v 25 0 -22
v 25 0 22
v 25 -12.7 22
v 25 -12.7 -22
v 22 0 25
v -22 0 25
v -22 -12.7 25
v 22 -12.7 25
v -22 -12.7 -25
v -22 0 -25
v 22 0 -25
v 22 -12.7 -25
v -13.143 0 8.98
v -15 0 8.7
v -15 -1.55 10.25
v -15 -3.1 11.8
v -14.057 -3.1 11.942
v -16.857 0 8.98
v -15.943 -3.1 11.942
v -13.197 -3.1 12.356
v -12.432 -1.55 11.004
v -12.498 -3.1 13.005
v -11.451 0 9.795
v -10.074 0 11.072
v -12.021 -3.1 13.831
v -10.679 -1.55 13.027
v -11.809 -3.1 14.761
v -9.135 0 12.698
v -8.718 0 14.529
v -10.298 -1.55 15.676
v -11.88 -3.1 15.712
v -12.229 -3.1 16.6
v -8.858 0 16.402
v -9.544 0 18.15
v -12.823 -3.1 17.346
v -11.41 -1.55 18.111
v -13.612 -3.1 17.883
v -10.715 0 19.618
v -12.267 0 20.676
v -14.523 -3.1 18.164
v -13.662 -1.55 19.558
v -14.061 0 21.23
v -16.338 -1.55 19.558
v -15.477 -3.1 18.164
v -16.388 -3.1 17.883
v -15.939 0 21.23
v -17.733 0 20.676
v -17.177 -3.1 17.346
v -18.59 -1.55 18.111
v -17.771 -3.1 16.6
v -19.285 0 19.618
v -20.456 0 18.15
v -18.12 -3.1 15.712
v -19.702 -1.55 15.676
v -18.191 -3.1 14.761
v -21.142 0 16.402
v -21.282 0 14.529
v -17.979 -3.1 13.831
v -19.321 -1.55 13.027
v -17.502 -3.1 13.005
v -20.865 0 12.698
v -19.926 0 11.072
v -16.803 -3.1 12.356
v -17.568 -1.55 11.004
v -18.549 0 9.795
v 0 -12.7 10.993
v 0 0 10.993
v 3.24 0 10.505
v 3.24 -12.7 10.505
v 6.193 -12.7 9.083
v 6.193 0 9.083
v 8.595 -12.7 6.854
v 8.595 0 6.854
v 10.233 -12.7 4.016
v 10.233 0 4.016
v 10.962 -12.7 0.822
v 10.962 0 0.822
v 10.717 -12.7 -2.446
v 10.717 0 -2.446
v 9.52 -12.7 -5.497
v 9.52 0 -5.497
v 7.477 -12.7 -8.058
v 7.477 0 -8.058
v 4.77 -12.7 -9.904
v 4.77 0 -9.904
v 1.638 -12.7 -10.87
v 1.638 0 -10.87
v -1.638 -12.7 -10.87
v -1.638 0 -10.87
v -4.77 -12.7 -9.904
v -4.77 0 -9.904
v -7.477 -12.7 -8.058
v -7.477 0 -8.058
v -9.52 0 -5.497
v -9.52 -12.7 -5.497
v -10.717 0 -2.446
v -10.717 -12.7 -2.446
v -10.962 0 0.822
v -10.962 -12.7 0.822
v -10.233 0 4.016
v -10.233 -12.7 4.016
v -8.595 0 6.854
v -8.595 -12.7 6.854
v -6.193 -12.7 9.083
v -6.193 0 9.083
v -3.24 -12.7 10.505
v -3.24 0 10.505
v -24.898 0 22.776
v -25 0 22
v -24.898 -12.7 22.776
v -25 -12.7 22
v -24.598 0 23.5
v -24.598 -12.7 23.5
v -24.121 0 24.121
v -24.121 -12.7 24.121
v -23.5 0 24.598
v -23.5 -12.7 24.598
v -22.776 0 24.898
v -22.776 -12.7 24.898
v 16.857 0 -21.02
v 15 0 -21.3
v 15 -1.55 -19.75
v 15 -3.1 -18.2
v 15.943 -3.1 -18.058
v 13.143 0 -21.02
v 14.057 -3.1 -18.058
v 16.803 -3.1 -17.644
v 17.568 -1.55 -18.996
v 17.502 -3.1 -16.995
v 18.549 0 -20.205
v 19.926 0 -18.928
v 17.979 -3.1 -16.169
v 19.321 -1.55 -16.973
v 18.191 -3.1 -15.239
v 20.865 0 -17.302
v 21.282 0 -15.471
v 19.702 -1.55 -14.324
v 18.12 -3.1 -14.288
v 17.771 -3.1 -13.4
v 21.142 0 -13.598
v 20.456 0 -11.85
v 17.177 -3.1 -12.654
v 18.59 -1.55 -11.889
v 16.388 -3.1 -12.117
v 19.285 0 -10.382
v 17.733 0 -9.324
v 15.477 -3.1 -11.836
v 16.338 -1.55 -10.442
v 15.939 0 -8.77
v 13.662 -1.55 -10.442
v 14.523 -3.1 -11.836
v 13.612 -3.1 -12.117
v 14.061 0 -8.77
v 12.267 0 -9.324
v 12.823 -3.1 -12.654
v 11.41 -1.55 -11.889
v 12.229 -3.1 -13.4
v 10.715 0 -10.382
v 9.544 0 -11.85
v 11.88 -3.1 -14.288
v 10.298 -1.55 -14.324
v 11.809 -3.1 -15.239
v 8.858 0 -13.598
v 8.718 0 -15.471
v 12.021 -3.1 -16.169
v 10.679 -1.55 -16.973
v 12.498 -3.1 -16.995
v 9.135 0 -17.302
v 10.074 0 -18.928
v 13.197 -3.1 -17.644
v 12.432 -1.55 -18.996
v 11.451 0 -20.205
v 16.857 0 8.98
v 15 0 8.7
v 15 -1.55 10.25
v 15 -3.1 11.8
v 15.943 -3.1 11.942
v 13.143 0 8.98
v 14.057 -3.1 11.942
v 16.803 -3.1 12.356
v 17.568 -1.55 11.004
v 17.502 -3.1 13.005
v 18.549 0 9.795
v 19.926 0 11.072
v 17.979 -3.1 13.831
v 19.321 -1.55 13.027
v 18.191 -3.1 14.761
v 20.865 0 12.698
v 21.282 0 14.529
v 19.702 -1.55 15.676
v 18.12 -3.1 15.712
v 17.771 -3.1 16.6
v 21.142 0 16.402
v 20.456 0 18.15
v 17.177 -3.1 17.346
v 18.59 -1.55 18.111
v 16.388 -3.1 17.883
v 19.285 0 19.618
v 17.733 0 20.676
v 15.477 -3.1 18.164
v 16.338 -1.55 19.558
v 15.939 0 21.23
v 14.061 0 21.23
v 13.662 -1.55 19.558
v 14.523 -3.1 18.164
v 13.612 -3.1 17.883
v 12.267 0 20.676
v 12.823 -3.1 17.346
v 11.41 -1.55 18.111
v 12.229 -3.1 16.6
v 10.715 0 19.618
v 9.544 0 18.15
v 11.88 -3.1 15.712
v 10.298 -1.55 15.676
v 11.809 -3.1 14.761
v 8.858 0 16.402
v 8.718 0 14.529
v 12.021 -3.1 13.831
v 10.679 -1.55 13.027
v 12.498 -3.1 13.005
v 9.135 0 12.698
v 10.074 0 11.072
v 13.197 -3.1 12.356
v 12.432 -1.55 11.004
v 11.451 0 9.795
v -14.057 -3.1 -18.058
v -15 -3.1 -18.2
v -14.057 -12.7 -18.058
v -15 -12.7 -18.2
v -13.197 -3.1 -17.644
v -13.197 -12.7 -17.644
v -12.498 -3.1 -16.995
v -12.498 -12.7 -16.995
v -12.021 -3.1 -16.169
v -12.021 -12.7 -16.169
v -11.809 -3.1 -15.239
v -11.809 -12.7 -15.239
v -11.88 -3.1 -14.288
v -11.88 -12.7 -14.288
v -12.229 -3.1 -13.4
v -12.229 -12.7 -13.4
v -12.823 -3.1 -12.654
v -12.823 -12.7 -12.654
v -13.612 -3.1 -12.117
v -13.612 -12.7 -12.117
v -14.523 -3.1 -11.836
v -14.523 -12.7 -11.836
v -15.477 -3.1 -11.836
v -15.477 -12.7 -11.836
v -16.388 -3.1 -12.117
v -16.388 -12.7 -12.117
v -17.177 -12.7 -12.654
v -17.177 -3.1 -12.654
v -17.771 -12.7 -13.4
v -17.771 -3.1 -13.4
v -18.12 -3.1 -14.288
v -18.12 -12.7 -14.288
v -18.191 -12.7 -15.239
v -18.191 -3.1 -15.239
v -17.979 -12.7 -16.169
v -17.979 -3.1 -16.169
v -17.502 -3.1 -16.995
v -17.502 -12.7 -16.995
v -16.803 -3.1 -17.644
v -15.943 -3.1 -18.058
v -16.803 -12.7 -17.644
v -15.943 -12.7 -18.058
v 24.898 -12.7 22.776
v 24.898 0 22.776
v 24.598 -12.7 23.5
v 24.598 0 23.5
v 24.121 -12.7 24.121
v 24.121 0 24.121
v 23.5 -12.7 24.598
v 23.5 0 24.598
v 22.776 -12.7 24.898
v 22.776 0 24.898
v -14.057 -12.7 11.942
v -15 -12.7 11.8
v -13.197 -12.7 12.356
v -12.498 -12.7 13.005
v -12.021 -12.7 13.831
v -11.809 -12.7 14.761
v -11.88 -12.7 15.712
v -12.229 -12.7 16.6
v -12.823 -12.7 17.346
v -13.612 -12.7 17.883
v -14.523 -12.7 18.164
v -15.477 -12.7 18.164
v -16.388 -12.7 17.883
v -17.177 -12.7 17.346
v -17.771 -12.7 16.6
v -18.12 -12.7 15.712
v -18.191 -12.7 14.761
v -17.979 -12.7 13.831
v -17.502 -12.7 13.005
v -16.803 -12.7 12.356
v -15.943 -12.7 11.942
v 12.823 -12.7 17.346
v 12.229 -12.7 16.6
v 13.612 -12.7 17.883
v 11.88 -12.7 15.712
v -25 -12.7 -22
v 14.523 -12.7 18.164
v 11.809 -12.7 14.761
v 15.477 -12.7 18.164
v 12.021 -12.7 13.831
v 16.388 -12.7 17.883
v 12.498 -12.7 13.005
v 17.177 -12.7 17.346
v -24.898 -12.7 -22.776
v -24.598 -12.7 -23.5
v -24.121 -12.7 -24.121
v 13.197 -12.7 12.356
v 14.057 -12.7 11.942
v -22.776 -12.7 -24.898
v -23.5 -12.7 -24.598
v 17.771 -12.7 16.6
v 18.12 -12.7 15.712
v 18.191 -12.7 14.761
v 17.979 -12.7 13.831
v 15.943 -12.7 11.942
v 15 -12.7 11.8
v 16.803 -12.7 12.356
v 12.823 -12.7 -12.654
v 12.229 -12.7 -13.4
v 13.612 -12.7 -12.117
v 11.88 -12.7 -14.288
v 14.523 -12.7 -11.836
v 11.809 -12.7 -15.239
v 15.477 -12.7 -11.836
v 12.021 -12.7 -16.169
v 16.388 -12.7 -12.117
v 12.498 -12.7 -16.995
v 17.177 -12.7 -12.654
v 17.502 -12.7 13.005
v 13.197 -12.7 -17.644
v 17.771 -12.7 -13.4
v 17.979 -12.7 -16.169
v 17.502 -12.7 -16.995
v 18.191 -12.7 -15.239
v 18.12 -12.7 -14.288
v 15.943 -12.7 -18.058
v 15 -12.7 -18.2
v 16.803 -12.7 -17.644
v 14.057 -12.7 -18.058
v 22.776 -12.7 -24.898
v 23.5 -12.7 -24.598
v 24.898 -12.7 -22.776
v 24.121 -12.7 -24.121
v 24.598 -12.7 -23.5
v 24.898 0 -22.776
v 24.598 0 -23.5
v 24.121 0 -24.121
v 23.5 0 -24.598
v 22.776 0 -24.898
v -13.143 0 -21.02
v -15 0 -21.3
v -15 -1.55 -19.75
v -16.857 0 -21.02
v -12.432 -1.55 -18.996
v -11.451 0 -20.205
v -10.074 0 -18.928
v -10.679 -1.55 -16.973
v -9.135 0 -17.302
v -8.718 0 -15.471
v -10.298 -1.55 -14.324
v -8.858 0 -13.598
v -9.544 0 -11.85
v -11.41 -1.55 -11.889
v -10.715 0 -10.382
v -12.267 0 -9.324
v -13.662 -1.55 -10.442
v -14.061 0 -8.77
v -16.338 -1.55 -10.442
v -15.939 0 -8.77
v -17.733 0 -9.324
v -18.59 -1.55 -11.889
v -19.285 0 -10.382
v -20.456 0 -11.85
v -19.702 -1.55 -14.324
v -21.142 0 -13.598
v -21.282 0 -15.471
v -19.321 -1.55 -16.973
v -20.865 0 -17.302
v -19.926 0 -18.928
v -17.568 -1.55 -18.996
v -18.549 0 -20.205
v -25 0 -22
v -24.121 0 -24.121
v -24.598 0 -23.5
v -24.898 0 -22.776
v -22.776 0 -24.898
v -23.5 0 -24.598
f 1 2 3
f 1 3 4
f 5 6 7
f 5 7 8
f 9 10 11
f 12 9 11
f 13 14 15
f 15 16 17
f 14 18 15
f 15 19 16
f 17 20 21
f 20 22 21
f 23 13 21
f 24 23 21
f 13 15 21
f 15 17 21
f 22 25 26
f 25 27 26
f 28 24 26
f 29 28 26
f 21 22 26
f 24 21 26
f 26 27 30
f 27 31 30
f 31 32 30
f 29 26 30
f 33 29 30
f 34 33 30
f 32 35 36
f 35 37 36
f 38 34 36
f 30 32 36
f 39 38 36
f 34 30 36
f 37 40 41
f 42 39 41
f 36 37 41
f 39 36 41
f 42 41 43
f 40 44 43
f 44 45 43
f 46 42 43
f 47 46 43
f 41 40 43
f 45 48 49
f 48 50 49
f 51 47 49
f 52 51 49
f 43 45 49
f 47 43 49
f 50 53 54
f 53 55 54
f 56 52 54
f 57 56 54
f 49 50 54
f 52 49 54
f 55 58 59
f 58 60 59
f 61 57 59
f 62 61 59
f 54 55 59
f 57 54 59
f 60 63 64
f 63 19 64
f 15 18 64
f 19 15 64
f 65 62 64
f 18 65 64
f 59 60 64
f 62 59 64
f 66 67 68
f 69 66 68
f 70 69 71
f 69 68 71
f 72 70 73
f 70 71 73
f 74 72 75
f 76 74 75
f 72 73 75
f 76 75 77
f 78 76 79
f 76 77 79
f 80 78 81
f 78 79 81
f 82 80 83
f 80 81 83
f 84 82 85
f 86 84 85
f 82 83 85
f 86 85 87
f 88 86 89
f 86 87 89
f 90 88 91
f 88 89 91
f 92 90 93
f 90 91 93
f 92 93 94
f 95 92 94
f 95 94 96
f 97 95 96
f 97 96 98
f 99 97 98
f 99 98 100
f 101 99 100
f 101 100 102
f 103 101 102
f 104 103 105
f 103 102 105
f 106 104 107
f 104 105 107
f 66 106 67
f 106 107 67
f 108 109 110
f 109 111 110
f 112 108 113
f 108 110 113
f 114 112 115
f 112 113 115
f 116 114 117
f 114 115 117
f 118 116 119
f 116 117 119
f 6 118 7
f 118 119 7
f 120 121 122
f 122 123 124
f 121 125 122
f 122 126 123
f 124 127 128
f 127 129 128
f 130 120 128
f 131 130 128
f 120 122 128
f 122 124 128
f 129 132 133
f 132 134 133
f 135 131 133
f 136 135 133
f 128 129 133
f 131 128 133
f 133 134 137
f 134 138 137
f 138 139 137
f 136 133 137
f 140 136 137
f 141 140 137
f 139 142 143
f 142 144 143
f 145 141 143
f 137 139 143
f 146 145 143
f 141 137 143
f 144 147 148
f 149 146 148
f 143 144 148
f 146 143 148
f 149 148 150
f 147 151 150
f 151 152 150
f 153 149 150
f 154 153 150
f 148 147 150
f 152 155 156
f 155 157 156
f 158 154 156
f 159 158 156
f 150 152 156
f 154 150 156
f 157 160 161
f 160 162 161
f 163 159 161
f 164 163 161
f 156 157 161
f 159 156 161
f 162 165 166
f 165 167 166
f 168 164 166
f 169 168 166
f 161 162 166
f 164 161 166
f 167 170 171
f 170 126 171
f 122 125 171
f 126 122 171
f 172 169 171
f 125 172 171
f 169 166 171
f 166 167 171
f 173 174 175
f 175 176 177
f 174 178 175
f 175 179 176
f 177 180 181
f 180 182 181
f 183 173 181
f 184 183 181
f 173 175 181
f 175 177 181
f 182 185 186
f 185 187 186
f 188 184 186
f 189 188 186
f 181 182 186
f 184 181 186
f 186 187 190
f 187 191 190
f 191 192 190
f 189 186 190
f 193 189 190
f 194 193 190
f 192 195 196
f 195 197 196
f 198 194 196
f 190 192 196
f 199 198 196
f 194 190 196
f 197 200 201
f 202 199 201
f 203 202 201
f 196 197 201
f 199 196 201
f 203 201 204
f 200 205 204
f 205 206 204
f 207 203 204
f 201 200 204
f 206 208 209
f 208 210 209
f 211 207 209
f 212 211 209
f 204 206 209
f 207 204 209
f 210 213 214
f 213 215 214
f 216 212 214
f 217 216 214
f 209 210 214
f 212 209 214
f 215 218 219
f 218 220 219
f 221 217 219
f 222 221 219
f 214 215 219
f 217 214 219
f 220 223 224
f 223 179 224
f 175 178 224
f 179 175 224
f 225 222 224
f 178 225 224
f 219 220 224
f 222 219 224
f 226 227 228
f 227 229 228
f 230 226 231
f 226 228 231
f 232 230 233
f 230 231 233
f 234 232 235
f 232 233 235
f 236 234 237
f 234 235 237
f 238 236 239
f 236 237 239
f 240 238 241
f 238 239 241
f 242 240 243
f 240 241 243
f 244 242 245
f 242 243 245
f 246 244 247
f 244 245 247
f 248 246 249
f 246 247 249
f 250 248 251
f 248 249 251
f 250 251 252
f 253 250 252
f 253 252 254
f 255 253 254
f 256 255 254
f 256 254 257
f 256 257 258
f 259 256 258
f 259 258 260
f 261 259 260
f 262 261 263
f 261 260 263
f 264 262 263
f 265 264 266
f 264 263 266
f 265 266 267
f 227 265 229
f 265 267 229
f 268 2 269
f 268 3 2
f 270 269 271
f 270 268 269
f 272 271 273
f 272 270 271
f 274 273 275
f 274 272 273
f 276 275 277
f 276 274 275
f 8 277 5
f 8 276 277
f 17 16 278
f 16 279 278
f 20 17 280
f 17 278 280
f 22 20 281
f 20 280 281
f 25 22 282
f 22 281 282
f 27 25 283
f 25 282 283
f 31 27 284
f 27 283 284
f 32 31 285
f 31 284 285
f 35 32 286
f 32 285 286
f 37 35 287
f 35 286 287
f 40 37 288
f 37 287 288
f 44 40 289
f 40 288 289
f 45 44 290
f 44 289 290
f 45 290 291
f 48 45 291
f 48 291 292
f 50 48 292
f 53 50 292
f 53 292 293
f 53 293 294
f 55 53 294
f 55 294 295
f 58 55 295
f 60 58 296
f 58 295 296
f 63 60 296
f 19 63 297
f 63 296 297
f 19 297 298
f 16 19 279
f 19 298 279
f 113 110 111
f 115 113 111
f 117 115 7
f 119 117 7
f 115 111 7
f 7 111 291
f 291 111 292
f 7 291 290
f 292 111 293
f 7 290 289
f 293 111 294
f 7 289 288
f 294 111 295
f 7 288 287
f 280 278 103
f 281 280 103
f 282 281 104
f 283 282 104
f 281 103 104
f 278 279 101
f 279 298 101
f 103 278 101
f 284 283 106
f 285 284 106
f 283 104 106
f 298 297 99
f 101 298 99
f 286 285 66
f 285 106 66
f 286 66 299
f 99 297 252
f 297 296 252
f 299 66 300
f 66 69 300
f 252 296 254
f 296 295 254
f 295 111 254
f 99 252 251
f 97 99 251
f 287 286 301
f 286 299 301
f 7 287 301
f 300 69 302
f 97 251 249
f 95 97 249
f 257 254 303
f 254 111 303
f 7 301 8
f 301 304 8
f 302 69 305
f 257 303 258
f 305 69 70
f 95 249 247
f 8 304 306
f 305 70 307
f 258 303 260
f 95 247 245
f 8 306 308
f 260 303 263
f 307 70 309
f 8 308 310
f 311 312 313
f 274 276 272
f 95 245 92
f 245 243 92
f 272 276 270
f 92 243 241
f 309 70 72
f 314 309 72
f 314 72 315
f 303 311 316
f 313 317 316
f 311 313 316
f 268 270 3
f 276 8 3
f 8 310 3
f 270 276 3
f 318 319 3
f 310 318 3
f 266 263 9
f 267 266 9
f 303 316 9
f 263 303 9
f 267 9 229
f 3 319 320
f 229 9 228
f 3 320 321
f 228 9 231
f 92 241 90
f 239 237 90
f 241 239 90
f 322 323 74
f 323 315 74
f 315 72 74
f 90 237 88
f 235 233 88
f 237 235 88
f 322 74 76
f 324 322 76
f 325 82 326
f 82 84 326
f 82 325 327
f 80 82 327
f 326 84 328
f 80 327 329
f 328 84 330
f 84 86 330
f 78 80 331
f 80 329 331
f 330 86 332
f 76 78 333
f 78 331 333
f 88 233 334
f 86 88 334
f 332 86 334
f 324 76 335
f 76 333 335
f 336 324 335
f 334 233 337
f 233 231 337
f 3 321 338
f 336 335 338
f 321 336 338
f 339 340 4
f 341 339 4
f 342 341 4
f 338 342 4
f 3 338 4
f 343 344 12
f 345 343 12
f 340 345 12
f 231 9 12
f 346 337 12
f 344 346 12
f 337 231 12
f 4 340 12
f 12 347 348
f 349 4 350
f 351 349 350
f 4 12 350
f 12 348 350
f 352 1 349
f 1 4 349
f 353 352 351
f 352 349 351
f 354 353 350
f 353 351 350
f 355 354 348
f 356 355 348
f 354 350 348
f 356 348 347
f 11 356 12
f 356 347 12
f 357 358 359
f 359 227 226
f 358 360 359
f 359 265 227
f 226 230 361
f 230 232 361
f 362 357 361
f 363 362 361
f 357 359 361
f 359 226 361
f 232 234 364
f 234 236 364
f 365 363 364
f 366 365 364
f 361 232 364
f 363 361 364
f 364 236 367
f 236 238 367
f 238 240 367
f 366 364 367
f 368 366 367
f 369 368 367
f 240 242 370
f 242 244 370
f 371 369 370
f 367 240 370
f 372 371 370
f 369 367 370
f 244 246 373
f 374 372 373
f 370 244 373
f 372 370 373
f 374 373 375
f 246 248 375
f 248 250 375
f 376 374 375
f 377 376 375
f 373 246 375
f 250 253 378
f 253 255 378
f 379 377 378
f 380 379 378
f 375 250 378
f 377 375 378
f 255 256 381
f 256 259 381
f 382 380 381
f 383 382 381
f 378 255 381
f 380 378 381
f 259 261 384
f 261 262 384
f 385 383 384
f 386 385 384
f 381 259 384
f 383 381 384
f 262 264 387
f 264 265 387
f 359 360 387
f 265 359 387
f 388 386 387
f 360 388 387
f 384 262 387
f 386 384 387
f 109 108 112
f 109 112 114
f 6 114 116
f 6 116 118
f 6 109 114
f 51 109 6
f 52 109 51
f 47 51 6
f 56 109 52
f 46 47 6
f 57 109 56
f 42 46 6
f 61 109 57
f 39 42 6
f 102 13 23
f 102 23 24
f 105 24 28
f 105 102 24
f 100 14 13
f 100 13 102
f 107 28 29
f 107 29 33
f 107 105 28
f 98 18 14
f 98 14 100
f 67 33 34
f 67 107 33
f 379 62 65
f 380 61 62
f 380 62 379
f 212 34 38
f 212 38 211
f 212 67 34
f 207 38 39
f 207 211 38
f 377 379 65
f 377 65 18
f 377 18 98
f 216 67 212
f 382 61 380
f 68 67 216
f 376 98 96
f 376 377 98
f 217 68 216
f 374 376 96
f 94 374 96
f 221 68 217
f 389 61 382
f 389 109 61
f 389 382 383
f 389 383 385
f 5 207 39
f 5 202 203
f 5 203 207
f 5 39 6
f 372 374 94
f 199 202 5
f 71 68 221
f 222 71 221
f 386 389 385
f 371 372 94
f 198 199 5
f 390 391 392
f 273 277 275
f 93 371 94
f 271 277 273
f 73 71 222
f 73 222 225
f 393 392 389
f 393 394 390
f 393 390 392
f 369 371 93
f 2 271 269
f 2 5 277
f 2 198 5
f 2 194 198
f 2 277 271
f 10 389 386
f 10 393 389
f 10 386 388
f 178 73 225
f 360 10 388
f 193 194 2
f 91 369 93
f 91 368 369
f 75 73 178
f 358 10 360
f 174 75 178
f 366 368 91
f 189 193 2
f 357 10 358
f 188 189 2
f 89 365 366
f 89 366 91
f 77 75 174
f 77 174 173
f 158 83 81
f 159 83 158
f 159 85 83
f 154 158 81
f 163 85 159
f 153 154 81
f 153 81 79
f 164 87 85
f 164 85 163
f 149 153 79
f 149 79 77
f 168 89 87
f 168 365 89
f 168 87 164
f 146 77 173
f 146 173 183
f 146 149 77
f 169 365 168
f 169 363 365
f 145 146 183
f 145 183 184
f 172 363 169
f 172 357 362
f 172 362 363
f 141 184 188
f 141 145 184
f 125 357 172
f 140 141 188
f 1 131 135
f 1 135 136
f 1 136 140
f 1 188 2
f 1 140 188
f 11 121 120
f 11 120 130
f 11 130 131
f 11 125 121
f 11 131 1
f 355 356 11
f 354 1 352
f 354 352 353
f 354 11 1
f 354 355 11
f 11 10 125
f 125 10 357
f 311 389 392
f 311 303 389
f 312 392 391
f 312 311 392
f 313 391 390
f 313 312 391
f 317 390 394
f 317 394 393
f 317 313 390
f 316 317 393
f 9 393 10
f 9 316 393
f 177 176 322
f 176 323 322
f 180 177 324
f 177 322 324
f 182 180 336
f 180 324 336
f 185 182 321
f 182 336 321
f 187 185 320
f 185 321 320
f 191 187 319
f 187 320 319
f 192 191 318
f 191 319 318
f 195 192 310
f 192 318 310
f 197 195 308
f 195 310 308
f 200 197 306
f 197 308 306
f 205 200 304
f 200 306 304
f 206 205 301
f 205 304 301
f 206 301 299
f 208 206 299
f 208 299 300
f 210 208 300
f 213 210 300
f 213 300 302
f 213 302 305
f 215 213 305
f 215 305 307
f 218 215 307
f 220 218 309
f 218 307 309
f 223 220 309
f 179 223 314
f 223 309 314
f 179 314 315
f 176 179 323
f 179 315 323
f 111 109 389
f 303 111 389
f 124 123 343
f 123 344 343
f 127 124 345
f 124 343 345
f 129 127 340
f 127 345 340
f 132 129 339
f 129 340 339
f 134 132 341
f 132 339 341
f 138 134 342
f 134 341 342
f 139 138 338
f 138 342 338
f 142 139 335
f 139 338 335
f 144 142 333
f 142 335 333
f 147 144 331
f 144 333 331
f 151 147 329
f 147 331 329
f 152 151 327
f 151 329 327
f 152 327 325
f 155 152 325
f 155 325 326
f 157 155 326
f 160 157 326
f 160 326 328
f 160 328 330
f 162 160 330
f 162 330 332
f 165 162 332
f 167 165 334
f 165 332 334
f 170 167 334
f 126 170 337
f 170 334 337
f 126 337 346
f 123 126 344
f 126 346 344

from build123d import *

# Parameters (mm, degrees)
SKETCH2_W                                       = 50
SKETCH2_H                                       = 50
SKETCH2_R                                       = 10.993
BOSS_EXTRUDE1_DEPTH                             = 12.7
CSK_FOR_M6_FLAT_HEAD_MACHINE_SCREW1_D           = 6.4
CSK_FOR_M6_FLAT_HEAD_MACHINE_SCREW1_CSINK_D     = 12.6
CSK_FOR_M6_FLAT_HEAD_MACHINE_SCREW1_CSINK_ANGLE = 90
FILLET1_R                                       = 3


with BuildPart() as part:
    # Sketch2 → Boss-Extrude1 (new body)
    with BuildSketch(Plane(origin=(0, 0, 0), x_dir=(1, 0, 0), z_dir=(0, 1, 0))):
        Rectangle(SKETCH2_W, SKETCH2_H)
        with Locations(Location((0, 0, 0), (0, 0, 270))):
            Circle(SKETCH2_R, mode=Mode.SUBTRACT)
    extrude(amount=-BOSS_EXTRUDE1_DEPTH)

    # CSK for M6 Flat Head Machine Screw1 (through all)
    with Locations(Plane(origin=(-15, 0, 15), x_dir=(0, 0, 1), z_dir=(0, 1, 0))):
        with Locations((0, 0), (0, 30), (-30, 0), (-30, 30)):
            CounterSinkHole(CSK_FOR_M6_FLAT_HEAD_MACHINE_SCREW1_D / 2, CSK_FOR_M6_FLAT_HEAD_MACHINE_SCREW1_CSINK_D / 2, counter_sink_angle=CSK_FOR_M6_FLAT_HEAD_MACHINE_SCREW1_CSINK_ANGLE)

    # Fillet1
    fillet1_edges = [part.edges().sort_by_distance(p)[0] for p in [
        (-25, -6.35, -25),
        (25, -6.35, -25),
        (25, -6.35, 25),
        (-25, -6.35, 25),
    ]]
    fillet(fillet1_edges, radius=FILLET1_R)


solid = part.part
